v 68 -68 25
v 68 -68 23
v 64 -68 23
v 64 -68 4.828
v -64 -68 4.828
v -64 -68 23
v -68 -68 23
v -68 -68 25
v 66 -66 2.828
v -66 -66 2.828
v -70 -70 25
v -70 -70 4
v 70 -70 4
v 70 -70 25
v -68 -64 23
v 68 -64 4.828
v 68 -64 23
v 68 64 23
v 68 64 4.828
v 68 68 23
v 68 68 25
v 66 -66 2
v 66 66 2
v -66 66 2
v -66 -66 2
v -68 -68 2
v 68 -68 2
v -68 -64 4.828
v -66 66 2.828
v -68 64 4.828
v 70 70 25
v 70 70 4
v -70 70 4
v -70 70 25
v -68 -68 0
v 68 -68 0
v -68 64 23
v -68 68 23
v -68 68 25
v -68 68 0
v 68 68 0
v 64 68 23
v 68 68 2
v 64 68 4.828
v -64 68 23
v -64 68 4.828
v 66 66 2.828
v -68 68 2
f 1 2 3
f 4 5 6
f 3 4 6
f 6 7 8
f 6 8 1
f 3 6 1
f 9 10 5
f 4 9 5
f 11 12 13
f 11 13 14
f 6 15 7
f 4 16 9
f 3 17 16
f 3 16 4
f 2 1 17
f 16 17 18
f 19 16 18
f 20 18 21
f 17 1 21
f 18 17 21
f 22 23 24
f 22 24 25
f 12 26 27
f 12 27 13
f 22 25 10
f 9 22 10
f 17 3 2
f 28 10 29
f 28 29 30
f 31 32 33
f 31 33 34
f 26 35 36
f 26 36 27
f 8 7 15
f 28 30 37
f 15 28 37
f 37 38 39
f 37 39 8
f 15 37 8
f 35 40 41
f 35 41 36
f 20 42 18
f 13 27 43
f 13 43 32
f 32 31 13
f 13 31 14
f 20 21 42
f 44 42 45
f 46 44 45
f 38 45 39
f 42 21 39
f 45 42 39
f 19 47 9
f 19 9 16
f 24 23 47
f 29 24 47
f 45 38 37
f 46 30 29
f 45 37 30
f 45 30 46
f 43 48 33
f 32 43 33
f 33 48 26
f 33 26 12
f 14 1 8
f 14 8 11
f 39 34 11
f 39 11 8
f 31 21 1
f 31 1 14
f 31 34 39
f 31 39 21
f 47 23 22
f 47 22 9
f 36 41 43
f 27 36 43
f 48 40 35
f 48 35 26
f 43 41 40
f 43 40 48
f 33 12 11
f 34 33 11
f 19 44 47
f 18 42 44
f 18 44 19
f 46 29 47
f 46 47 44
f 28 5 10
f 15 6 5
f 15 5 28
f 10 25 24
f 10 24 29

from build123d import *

# Parameters (mm, degrees)
F1_DEPTH = 70
F3_DEPTH = 70
F4_COUNT = 4
F5_T     = -2
F7_DEPTH = 23
F8_DEPTH = 2


with BuildPart() as f1:
    # F0 (on Front) → F1 (new body)
    with BuildSketch(Plane.XZ):
        Polygon((0, 25), (0, 0), (68, 0), (68, 2), (70, 4), (70, 25), align=None)
    extrude(amount=-F1_DEPTH)

    # F2 (on Right) → F3 (intersect, through all)
    with BuildSketch(Plane.YZ):
        Polygon((0, 25), (0, 0), (68, 0), (68, 2), (70, 4), (70, 25), align=None)
    extrude(amount=F3_DEPTH, mode=Mode.INTERSECT)

    # F4: F1 ×4 about axis
    f4_axis = Axis((0, 0, 12.5), (0, 0, 1))


with BuildPart() as f1_1:
    add(f1.part)
    for i in range(1, F4_COUNT):
        add(f1.part.rotate(f4_axis, i * 360 / F4_COUNT))

    # F5
    f5_openings = [f1_1.faces().sort_by_distance(p)[0] for p in [
        (0, 0, 25),
    ]]
    offset(amount=F5_T, openings=f5_openings, kind=Kind.INTERSECTION)

    # F6 (on face) → F7 (join, through all)
    with BuildSketch(Plane.XY.offset(25)):
        Polygon((-66, -66), (-68, -64), (-68, -68), (-64, -68), align=None)
        Polygon((68, -68), (68, -64), (64, -68), align=None)
        Polygon((68, 68), (64, 68), (66, 66), (68, 64), align=None)
        Polygon((-64, 68), (-68, 68), (-68, 64), (-66, 66), align=None)
    extrude(amount=-F7_DEPTH)

    # F6 (on face) → F8 (cut)
    with BuildSketch(Plane.XY.offset(25)):
        Polygon((68, -68), (68, -64), (64, -68), align=None)
        Polygon((68, 68), (64, 68), (66, 66), (68, 64), align=None)
        Polygon((-64, 68), (-68, 68), (-68, 64), (-66, 66), align=None)
        Polygon((-66, -66), (-68, -64), (-68, -68), (-64, -68), align=None)
    extrude(amount=-F8_DEPTH, mode=Mode.SUBTRACT)


solid = f1_1.part
